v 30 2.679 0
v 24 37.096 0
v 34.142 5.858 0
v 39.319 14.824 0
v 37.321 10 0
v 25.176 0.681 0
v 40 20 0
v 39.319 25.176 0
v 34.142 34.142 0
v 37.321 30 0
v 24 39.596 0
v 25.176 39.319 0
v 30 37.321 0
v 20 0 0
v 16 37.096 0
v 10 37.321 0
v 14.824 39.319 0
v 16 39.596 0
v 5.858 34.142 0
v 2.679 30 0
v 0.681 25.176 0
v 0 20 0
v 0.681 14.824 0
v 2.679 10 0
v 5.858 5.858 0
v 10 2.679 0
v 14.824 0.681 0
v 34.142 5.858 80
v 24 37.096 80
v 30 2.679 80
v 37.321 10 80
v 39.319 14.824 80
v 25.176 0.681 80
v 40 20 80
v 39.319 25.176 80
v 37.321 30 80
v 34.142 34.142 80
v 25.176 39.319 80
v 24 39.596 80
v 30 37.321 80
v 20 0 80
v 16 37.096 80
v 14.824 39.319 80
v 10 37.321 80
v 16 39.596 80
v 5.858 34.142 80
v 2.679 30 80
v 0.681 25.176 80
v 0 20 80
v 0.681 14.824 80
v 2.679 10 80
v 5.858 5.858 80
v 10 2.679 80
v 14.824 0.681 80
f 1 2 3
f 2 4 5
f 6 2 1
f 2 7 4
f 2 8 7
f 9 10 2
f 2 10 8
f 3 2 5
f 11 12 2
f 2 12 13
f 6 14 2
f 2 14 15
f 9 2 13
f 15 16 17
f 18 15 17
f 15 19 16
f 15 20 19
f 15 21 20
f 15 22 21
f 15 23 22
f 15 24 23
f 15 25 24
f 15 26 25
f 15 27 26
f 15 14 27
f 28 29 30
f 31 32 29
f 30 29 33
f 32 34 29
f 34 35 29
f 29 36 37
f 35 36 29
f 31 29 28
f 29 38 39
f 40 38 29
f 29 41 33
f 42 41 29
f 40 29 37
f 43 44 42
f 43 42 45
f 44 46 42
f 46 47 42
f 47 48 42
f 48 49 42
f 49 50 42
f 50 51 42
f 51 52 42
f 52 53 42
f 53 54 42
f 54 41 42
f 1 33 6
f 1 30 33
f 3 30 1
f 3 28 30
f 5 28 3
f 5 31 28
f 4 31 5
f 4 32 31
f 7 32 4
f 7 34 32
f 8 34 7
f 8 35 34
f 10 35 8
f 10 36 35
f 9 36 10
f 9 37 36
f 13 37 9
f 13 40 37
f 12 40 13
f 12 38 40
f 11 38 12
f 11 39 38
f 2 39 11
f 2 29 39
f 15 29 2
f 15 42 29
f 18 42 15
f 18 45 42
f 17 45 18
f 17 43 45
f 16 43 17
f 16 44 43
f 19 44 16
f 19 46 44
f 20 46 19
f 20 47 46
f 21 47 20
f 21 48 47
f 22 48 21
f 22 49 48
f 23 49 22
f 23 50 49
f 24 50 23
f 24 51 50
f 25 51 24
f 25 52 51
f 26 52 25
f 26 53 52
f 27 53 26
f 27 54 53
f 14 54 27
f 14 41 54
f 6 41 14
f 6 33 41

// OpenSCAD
$fn = 32;

// ----------------------------------------------------------------------
// Keyway shaft: d40 shaft, key 8 x 2.5 mm
// ----------------------------------------------------------------------

// --- parameters (mm) ---
shaft_r = 20;             // shaft radius
key_w = 8;                // keyway width
key_d = 2.5;              // keyway depth below the surface line
plate_t = 80;             // shaft length, Z (extrusion height)

shaft_d = 2 * shaft_r;  // shaft diameter
circle_step = 15;  // polygon sampling step, degrees

profile = [[14.824, 39.319], [10, 37.321], [5.858, 34.142], [2.679, 30], [0.681, 25.176], [0, 20], [0.681, 14.824], [2.679, 10], [5.858, 5.858], [10, 2.679], [14.824, 0.681], [20, 0], [25.176, 0.681], [30, 2.679], [34.142, 5.858], [37.321, 10], [39.319, 14.824], [40, 20], [39.319, 25.176], [37.321, 30], [34.142, 34.142], [30, 37.321], [25.176, 39.319], [24, 39.596], [24, 37.096], [16, 37.096], [16, 39.596]];  // primary outline, 27 points, counter clockwise

// --- the one profile operation ---
linear_extrude(height = plate_t) polygon(points = profile);
